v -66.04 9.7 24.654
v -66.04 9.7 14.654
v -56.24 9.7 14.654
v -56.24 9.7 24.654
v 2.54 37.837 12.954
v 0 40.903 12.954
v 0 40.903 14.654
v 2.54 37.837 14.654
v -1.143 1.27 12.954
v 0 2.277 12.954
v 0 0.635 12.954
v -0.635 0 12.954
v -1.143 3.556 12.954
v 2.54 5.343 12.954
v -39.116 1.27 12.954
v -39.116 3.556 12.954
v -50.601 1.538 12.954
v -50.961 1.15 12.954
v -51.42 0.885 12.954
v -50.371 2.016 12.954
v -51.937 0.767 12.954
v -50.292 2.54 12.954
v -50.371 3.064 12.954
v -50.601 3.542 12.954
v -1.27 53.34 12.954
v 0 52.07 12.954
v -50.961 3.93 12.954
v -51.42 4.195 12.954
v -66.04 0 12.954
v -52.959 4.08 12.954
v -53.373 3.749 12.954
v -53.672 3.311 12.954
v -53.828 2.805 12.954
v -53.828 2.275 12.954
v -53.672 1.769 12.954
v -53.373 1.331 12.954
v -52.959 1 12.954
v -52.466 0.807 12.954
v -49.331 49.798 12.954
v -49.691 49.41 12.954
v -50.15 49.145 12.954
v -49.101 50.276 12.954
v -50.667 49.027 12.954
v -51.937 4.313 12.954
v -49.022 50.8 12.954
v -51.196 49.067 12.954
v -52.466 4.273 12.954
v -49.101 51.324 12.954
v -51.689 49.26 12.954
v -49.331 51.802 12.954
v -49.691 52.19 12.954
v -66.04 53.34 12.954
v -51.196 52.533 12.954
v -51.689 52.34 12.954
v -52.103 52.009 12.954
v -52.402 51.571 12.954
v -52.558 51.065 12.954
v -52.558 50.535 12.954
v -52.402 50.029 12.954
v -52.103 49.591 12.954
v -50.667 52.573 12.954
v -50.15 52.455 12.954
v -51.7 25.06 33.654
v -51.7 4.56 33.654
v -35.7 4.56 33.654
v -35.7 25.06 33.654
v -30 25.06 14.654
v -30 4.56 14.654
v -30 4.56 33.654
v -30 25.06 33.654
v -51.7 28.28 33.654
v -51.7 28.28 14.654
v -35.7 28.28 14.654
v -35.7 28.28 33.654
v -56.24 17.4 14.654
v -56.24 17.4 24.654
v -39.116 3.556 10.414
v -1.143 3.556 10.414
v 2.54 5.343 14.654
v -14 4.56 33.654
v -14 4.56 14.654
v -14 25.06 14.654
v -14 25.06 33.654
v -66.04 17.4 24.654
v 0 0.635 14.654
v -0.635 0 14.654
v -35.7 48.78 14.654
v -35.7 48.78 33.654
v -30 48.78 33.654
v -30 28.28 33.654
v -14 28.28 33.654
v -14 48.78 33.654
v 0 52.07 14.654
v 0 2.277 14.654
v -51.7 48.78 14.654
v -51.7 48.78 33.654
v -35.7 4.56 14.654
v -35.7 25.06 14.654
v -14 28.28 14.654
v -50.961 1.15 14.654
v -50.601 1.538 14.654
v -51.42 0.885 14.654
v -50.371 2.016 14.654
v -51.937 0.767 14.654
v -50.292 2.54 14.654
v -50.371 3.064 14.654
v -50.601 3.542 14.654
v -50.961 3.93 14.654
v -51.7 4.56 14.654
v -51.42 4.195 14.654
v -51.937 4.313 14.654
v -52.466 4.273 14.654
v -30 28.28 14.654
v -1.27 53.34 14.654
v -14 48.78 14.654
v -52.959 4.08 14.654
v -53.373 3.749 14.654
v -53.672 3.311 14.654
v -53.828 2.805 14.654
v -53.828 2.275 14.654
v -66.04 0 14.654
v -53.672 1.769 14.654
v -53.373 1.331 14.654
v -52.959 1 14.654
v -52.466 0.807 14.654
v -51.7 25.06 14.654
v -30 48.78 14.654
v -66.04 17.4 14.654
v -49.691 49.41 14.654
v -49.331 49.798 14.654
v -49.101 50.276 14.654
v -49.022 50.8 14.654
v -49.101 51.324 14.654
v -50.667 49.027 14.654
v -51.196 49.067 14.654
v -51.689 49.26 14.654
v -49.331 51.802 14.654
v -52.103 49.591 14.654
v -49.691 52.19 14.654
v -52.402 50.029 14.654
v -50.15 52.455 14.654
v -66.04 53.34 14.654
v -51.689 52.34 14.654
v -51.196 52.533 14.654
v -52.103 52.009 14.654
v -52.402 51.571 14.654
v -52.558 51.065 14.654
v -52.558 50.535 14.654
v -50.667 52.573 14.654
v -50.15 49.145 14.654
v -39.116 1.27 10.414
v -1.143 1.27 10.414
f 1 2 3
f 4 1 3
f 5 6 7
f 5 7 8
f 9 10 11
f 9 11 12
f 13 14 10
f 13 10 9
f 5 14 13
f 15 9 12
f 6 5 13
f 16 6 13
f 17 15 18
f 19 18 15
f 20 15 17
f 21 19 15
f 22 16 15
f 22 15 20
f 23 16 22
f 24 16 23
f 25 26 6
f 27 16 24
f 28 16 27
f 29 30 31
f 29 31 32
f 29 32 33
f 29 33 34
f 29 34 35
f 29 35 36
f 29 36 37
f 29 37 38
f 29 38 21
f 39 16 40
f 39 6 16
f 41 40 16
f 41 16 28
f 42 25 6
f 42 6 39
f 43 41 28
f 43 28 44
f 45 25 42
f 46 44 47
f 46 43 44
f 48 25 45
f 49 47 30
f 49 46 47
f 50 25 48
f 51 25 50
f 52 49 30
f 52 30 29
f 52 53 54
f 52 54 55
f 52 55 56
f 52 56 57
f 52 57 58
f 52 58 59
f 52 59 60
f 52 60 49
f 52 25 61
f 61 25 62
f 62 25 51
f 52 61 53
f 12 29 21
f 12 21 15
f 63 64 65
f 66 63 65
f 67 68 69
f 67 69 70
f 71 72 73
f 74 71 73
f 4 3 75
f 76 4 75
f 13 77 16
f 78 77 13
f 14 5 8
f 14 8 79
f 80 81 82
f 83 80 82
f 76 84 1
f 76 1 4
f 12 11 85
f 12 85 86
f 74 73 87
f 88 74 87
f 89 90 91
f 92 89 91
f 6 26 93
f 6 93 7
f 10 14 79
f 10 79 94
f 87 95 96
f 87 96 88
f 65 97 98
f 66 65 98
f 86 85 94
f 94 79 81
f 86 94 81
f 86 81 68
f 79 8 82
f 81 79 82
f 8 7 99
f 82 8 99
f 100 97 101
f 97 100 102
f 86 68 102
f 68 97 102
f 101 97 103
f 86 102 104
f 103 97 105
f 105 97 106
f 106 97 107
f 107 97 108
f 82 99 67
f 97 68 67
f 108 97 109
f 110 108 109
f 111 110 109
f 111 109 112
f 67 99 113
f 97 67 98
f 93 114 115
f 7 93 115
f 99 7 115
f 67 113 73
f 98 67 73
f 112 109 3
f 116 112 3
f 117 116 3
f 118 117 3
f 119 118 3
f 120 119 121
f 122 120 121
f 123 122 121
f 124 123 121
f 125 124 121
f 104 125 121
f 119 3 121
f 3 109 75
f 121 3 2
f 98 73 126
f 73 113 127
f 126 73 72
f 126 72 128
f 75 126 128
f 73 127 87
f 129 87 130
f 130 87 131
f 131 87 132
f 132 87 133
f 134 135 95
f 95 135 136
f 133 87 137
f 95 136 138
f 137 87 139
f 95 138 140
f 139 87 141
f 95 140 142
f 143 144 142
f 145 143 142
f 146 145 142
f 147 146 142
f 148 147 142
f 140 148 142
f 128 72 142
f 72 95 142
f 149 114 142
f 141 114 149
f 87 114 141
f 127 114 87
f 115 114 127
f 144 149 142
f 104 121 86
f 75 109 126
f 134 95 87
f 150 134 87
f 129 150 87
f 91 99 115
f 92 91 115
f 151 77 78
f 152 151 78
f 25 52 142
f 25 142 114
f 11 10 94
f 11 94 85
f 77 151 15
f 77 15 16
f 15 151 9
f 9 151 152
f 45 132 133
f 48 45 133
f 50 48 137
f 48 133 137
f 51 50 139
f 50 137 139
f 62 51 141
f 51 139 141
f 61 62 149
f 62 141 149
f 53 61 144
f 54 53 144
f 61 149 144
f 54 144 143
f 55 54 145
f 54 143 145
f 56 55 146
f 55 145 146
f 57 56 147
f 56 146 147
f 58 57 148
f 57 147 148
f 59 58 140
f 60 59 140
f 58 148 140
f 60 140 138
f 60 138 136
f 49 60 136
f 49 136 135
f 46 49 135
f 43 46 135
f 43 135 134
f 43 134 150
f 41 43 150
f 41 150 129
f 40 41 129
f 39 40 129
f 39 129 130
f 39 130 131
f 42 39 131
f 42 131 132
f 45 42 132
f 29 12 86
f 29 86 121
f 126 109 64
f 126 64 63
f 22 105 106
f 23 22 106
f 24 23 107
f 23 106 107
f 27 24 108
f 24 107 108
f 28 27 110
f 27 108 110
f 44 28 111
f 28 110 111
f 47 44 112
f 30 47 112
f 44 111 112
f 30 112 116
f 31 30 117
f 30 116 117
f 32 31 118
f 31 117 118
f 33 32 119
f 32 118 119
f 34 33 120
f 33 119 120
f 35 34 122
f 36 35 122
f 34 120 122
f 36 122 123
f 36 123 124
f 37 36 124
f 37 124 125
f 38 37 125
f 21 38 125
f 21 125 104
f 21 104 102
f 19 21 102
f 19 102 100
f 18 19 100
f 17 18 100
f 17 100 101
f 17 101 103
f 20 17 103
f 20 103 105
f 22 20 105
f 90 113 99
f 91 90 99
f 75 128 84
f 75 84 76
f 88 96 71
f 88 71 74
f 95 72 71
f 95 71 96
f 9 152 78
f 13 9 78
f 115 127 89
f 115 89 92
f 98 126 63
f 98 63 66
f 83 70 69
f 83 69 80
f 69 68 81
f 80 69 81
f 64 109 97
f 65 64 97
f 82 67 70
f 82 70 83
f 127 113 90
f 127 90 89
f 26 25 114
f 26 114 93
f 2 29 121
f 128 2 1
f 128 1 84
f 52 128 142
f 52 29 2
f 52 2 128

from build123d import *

# Parameters (mm, degrees)
SKETCH_W     = 37.973
SKETCH_H     = 2.286
PAD_DEPTH    = 2.54
PAD001_DEPTH = 1.7
SKETCH002_R  = 1.778
POCKET_DEPTH = 5
SKETCH003_W  = 16
SKETCH003_H  = 20.5
PAD002_DEPTH = 19
SKETCH007_W  = 9.8
SKETCH007_H  = 7.7
PAD004_DEPTH = 10


with BuildPart() as part:
    # Sketch (on Face2 of Binder001) → Pad (new body)
    with BuildSketch(Plane.XY.offset(10.414)):
        with Locations((-20.1295, 2.413)):
            Rectangle(SKETCH_W, SKETCH_H)
    extrude(amount=PAD_DEPTH)

    # Sketch001 (on Face6 of Pad) → Pad001 (join)
    with BuildSketch(Plane.XY.offset(12.954)):
        Polygon((-66.04, 53.34), (-1.27, 53.34), (0, 52.07), (0, 40.903026), (2.54, 37.836974), (2.54, 5.343026), (0, 2.276974), (0, 0.635), (-0.635, 0), (-66.04, 0), align=None)
    extrude(amount=PAD001_DEPTH)

    # Sketch002 (on Face5 of Pad001) → Pocket (cut)
    with BuildSketch(Plane.XY.offset(14.654)):
        with Locations((-52.07, 2.54)):
            Circle(SKETCH002_R)
        with Locations((-50.8, 50.8)):
            Circle(SKETCH002_R)
    extrude(amount=-POCKET_DEPTH, mode=Mode.SUBTRACT)

    # Sketch003 (on Face5 of Pocket) → Pad002 (join)
    with BuildSketch(Plane.XY.offset(14.654)):
        with Locations((-43.7, 38.53)):
            Rectangle(SKETCH003_W, SKETCH003_H)
        with Locations((-22, 38.53)):
            Rectangle(SKETCH003_W, SKETCH003_H)
        with Locations((-43.7, 14.81)):
            Rectangle(SKETCH003_W, SKETCH003_H)
        with Locations((-22, 14.81)):
            Rectangle(SKETCH003_W, SKETCH003_H)
    extrude(amount=PAD002_DEPTH)

    # Sketch007 (on Face5 of Pad002) → Pad004 (join)
    with BuildSketch(Plane.XY.offset(14.654)):
        with Locations((-61.14, 13.55)):
            Rectangle(SKETCH007_W, SKETCH007_H)
    extrude(amount=PAD004_DEPTH)


solid = part.part
